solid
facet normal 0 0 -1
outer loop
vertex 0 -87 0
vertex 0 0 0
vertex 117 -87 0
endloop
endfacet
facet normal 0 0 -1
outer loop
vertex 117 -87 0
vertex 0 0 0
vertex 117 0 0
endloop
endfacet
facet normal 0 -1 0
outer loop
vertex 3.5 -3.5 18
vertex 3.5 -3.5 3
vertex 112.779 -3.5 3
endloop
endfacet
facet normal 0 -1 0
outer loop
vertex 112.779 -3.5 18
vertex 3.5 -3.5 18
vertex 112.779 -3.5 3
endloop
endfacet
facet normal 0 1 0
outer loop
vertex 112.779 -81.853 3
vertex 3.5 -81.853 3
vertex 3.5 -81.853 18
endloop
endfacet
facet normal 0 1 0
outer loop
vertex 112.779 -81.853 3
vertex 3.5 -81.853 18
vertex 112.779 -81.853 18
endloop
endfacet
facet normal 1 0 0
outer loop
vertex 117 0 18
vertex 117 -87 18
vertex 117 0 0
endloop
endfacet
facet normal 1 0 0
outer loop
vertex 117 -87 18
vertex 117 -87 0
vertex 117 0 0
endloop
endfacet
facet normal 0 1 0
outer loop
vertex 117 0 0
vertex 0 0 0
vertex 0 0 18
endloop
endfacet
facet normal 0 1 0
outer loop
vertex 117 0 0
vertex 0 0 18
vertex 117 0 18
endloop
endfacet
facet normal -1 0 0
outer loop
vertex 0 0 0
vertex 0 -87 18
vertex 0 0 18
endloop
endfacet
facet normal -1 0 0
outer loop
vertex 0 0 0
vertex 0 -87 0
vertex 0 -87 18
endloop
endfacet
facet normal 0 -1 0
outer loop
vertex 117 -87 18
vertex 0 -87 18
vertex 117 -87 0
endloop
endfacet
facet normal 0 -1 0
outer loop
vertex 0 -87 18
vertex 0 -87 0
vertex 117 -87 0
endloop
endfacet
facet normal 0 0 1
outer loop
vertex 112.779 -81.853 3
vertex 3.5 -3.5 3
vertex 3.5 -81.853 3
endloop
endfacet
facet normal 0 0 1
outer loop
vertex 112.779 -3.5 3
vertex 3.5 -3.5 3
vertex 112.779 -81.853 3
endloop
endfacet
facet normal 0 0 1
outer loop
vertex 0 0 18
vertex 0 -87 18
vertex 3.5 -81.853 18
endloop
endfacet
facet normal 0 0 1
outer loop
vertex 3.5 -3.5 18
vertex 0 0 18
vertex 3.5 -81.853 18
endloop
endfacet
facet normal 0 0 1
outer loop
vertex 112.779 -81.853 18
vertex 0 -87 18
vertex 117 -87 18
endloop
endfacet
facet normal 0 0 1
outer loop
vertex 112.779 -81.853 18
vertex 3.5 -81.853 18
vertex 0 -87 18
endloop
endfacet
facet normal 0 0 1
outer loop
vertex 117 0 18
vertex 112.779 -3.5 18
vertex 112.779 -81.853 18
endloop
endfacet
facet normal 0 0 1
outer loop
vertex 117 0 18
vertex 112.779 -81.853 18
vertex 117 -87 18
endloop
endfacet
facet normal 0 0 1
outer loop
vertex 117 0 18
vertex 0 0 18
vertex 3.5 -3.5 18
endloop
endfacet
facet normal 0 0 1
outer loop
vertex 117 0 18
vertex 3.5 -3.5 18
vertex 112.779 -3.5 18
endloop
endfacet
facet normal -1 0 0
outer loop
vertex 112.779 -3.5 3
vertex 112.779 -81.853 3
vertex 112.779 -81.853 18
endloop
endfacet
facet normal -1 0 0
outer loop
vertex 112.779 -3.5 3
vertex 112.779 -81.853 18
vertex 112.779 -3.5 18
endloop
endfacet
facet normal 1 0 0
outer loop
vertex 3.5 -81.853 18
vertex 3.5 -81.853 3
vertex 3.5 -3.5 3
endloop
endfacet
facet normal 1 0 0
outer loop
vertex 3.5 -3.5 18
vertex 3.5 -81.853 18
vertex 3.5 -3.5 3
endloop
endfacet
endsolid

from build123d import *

# Parameters (mm, degrees)
SKETCH_1_W      = 117
SKETCH_1_H      = 87
SKETCH_1_W_2    = 110
SKETCH_1_H_2    = 80
EXTRUDE_1_DEPTH = 3
SKETCH_2_W      = 117
SKETCH_2_H      = 87
SKETCH_2_W_2    = 109.279406394
SKETCH_2_H_2    = 78.35290245
EXTRUDE_2_DEPTH = 15


with BuildPart() as part:
    # 草图1 → 凸台-拉伸1 (new body)
    # profile 1 of 2: a face of its own
    with BuildSketch(Plane.XY):
        with Locations((58.5, -43.5)):
            Rectangle(SKETCH_1_W, SKETCH_1_H)
        with Locations((58.5, -43.5)):
            Rectangle(SKETCH_1_W_2, SKETCH_1_H_2, mode=Mode.SUBTRACT)
    # profile 2 of 2: a face of its own
    with BuildSketch(Plane.XY):
        with Locations((58.5, -43.5)):
            Rectangle(SKETCH_1_W_2, SKETCH_1_H_2)
    extrude(amount=EXTRUDE_1_DEPTH)

    # 草图2 → 凸台-拉伸2 (add)
    with BuildSketch(Plane.XY.offset(3)):
        with Locations((58.5, -43.5)):
            Rectangle(SKETCH_2_W, SKETCH_2_H)
        with Locations((58.139703197, -42.676451225)):
            Rectangle(SKETCH_2_W_2, SKETCH_2_H_2, mode=Mode.SUBTRACT)
    extrude(amount=EXTRUDE_2_DEPTH)


solid = part.part
